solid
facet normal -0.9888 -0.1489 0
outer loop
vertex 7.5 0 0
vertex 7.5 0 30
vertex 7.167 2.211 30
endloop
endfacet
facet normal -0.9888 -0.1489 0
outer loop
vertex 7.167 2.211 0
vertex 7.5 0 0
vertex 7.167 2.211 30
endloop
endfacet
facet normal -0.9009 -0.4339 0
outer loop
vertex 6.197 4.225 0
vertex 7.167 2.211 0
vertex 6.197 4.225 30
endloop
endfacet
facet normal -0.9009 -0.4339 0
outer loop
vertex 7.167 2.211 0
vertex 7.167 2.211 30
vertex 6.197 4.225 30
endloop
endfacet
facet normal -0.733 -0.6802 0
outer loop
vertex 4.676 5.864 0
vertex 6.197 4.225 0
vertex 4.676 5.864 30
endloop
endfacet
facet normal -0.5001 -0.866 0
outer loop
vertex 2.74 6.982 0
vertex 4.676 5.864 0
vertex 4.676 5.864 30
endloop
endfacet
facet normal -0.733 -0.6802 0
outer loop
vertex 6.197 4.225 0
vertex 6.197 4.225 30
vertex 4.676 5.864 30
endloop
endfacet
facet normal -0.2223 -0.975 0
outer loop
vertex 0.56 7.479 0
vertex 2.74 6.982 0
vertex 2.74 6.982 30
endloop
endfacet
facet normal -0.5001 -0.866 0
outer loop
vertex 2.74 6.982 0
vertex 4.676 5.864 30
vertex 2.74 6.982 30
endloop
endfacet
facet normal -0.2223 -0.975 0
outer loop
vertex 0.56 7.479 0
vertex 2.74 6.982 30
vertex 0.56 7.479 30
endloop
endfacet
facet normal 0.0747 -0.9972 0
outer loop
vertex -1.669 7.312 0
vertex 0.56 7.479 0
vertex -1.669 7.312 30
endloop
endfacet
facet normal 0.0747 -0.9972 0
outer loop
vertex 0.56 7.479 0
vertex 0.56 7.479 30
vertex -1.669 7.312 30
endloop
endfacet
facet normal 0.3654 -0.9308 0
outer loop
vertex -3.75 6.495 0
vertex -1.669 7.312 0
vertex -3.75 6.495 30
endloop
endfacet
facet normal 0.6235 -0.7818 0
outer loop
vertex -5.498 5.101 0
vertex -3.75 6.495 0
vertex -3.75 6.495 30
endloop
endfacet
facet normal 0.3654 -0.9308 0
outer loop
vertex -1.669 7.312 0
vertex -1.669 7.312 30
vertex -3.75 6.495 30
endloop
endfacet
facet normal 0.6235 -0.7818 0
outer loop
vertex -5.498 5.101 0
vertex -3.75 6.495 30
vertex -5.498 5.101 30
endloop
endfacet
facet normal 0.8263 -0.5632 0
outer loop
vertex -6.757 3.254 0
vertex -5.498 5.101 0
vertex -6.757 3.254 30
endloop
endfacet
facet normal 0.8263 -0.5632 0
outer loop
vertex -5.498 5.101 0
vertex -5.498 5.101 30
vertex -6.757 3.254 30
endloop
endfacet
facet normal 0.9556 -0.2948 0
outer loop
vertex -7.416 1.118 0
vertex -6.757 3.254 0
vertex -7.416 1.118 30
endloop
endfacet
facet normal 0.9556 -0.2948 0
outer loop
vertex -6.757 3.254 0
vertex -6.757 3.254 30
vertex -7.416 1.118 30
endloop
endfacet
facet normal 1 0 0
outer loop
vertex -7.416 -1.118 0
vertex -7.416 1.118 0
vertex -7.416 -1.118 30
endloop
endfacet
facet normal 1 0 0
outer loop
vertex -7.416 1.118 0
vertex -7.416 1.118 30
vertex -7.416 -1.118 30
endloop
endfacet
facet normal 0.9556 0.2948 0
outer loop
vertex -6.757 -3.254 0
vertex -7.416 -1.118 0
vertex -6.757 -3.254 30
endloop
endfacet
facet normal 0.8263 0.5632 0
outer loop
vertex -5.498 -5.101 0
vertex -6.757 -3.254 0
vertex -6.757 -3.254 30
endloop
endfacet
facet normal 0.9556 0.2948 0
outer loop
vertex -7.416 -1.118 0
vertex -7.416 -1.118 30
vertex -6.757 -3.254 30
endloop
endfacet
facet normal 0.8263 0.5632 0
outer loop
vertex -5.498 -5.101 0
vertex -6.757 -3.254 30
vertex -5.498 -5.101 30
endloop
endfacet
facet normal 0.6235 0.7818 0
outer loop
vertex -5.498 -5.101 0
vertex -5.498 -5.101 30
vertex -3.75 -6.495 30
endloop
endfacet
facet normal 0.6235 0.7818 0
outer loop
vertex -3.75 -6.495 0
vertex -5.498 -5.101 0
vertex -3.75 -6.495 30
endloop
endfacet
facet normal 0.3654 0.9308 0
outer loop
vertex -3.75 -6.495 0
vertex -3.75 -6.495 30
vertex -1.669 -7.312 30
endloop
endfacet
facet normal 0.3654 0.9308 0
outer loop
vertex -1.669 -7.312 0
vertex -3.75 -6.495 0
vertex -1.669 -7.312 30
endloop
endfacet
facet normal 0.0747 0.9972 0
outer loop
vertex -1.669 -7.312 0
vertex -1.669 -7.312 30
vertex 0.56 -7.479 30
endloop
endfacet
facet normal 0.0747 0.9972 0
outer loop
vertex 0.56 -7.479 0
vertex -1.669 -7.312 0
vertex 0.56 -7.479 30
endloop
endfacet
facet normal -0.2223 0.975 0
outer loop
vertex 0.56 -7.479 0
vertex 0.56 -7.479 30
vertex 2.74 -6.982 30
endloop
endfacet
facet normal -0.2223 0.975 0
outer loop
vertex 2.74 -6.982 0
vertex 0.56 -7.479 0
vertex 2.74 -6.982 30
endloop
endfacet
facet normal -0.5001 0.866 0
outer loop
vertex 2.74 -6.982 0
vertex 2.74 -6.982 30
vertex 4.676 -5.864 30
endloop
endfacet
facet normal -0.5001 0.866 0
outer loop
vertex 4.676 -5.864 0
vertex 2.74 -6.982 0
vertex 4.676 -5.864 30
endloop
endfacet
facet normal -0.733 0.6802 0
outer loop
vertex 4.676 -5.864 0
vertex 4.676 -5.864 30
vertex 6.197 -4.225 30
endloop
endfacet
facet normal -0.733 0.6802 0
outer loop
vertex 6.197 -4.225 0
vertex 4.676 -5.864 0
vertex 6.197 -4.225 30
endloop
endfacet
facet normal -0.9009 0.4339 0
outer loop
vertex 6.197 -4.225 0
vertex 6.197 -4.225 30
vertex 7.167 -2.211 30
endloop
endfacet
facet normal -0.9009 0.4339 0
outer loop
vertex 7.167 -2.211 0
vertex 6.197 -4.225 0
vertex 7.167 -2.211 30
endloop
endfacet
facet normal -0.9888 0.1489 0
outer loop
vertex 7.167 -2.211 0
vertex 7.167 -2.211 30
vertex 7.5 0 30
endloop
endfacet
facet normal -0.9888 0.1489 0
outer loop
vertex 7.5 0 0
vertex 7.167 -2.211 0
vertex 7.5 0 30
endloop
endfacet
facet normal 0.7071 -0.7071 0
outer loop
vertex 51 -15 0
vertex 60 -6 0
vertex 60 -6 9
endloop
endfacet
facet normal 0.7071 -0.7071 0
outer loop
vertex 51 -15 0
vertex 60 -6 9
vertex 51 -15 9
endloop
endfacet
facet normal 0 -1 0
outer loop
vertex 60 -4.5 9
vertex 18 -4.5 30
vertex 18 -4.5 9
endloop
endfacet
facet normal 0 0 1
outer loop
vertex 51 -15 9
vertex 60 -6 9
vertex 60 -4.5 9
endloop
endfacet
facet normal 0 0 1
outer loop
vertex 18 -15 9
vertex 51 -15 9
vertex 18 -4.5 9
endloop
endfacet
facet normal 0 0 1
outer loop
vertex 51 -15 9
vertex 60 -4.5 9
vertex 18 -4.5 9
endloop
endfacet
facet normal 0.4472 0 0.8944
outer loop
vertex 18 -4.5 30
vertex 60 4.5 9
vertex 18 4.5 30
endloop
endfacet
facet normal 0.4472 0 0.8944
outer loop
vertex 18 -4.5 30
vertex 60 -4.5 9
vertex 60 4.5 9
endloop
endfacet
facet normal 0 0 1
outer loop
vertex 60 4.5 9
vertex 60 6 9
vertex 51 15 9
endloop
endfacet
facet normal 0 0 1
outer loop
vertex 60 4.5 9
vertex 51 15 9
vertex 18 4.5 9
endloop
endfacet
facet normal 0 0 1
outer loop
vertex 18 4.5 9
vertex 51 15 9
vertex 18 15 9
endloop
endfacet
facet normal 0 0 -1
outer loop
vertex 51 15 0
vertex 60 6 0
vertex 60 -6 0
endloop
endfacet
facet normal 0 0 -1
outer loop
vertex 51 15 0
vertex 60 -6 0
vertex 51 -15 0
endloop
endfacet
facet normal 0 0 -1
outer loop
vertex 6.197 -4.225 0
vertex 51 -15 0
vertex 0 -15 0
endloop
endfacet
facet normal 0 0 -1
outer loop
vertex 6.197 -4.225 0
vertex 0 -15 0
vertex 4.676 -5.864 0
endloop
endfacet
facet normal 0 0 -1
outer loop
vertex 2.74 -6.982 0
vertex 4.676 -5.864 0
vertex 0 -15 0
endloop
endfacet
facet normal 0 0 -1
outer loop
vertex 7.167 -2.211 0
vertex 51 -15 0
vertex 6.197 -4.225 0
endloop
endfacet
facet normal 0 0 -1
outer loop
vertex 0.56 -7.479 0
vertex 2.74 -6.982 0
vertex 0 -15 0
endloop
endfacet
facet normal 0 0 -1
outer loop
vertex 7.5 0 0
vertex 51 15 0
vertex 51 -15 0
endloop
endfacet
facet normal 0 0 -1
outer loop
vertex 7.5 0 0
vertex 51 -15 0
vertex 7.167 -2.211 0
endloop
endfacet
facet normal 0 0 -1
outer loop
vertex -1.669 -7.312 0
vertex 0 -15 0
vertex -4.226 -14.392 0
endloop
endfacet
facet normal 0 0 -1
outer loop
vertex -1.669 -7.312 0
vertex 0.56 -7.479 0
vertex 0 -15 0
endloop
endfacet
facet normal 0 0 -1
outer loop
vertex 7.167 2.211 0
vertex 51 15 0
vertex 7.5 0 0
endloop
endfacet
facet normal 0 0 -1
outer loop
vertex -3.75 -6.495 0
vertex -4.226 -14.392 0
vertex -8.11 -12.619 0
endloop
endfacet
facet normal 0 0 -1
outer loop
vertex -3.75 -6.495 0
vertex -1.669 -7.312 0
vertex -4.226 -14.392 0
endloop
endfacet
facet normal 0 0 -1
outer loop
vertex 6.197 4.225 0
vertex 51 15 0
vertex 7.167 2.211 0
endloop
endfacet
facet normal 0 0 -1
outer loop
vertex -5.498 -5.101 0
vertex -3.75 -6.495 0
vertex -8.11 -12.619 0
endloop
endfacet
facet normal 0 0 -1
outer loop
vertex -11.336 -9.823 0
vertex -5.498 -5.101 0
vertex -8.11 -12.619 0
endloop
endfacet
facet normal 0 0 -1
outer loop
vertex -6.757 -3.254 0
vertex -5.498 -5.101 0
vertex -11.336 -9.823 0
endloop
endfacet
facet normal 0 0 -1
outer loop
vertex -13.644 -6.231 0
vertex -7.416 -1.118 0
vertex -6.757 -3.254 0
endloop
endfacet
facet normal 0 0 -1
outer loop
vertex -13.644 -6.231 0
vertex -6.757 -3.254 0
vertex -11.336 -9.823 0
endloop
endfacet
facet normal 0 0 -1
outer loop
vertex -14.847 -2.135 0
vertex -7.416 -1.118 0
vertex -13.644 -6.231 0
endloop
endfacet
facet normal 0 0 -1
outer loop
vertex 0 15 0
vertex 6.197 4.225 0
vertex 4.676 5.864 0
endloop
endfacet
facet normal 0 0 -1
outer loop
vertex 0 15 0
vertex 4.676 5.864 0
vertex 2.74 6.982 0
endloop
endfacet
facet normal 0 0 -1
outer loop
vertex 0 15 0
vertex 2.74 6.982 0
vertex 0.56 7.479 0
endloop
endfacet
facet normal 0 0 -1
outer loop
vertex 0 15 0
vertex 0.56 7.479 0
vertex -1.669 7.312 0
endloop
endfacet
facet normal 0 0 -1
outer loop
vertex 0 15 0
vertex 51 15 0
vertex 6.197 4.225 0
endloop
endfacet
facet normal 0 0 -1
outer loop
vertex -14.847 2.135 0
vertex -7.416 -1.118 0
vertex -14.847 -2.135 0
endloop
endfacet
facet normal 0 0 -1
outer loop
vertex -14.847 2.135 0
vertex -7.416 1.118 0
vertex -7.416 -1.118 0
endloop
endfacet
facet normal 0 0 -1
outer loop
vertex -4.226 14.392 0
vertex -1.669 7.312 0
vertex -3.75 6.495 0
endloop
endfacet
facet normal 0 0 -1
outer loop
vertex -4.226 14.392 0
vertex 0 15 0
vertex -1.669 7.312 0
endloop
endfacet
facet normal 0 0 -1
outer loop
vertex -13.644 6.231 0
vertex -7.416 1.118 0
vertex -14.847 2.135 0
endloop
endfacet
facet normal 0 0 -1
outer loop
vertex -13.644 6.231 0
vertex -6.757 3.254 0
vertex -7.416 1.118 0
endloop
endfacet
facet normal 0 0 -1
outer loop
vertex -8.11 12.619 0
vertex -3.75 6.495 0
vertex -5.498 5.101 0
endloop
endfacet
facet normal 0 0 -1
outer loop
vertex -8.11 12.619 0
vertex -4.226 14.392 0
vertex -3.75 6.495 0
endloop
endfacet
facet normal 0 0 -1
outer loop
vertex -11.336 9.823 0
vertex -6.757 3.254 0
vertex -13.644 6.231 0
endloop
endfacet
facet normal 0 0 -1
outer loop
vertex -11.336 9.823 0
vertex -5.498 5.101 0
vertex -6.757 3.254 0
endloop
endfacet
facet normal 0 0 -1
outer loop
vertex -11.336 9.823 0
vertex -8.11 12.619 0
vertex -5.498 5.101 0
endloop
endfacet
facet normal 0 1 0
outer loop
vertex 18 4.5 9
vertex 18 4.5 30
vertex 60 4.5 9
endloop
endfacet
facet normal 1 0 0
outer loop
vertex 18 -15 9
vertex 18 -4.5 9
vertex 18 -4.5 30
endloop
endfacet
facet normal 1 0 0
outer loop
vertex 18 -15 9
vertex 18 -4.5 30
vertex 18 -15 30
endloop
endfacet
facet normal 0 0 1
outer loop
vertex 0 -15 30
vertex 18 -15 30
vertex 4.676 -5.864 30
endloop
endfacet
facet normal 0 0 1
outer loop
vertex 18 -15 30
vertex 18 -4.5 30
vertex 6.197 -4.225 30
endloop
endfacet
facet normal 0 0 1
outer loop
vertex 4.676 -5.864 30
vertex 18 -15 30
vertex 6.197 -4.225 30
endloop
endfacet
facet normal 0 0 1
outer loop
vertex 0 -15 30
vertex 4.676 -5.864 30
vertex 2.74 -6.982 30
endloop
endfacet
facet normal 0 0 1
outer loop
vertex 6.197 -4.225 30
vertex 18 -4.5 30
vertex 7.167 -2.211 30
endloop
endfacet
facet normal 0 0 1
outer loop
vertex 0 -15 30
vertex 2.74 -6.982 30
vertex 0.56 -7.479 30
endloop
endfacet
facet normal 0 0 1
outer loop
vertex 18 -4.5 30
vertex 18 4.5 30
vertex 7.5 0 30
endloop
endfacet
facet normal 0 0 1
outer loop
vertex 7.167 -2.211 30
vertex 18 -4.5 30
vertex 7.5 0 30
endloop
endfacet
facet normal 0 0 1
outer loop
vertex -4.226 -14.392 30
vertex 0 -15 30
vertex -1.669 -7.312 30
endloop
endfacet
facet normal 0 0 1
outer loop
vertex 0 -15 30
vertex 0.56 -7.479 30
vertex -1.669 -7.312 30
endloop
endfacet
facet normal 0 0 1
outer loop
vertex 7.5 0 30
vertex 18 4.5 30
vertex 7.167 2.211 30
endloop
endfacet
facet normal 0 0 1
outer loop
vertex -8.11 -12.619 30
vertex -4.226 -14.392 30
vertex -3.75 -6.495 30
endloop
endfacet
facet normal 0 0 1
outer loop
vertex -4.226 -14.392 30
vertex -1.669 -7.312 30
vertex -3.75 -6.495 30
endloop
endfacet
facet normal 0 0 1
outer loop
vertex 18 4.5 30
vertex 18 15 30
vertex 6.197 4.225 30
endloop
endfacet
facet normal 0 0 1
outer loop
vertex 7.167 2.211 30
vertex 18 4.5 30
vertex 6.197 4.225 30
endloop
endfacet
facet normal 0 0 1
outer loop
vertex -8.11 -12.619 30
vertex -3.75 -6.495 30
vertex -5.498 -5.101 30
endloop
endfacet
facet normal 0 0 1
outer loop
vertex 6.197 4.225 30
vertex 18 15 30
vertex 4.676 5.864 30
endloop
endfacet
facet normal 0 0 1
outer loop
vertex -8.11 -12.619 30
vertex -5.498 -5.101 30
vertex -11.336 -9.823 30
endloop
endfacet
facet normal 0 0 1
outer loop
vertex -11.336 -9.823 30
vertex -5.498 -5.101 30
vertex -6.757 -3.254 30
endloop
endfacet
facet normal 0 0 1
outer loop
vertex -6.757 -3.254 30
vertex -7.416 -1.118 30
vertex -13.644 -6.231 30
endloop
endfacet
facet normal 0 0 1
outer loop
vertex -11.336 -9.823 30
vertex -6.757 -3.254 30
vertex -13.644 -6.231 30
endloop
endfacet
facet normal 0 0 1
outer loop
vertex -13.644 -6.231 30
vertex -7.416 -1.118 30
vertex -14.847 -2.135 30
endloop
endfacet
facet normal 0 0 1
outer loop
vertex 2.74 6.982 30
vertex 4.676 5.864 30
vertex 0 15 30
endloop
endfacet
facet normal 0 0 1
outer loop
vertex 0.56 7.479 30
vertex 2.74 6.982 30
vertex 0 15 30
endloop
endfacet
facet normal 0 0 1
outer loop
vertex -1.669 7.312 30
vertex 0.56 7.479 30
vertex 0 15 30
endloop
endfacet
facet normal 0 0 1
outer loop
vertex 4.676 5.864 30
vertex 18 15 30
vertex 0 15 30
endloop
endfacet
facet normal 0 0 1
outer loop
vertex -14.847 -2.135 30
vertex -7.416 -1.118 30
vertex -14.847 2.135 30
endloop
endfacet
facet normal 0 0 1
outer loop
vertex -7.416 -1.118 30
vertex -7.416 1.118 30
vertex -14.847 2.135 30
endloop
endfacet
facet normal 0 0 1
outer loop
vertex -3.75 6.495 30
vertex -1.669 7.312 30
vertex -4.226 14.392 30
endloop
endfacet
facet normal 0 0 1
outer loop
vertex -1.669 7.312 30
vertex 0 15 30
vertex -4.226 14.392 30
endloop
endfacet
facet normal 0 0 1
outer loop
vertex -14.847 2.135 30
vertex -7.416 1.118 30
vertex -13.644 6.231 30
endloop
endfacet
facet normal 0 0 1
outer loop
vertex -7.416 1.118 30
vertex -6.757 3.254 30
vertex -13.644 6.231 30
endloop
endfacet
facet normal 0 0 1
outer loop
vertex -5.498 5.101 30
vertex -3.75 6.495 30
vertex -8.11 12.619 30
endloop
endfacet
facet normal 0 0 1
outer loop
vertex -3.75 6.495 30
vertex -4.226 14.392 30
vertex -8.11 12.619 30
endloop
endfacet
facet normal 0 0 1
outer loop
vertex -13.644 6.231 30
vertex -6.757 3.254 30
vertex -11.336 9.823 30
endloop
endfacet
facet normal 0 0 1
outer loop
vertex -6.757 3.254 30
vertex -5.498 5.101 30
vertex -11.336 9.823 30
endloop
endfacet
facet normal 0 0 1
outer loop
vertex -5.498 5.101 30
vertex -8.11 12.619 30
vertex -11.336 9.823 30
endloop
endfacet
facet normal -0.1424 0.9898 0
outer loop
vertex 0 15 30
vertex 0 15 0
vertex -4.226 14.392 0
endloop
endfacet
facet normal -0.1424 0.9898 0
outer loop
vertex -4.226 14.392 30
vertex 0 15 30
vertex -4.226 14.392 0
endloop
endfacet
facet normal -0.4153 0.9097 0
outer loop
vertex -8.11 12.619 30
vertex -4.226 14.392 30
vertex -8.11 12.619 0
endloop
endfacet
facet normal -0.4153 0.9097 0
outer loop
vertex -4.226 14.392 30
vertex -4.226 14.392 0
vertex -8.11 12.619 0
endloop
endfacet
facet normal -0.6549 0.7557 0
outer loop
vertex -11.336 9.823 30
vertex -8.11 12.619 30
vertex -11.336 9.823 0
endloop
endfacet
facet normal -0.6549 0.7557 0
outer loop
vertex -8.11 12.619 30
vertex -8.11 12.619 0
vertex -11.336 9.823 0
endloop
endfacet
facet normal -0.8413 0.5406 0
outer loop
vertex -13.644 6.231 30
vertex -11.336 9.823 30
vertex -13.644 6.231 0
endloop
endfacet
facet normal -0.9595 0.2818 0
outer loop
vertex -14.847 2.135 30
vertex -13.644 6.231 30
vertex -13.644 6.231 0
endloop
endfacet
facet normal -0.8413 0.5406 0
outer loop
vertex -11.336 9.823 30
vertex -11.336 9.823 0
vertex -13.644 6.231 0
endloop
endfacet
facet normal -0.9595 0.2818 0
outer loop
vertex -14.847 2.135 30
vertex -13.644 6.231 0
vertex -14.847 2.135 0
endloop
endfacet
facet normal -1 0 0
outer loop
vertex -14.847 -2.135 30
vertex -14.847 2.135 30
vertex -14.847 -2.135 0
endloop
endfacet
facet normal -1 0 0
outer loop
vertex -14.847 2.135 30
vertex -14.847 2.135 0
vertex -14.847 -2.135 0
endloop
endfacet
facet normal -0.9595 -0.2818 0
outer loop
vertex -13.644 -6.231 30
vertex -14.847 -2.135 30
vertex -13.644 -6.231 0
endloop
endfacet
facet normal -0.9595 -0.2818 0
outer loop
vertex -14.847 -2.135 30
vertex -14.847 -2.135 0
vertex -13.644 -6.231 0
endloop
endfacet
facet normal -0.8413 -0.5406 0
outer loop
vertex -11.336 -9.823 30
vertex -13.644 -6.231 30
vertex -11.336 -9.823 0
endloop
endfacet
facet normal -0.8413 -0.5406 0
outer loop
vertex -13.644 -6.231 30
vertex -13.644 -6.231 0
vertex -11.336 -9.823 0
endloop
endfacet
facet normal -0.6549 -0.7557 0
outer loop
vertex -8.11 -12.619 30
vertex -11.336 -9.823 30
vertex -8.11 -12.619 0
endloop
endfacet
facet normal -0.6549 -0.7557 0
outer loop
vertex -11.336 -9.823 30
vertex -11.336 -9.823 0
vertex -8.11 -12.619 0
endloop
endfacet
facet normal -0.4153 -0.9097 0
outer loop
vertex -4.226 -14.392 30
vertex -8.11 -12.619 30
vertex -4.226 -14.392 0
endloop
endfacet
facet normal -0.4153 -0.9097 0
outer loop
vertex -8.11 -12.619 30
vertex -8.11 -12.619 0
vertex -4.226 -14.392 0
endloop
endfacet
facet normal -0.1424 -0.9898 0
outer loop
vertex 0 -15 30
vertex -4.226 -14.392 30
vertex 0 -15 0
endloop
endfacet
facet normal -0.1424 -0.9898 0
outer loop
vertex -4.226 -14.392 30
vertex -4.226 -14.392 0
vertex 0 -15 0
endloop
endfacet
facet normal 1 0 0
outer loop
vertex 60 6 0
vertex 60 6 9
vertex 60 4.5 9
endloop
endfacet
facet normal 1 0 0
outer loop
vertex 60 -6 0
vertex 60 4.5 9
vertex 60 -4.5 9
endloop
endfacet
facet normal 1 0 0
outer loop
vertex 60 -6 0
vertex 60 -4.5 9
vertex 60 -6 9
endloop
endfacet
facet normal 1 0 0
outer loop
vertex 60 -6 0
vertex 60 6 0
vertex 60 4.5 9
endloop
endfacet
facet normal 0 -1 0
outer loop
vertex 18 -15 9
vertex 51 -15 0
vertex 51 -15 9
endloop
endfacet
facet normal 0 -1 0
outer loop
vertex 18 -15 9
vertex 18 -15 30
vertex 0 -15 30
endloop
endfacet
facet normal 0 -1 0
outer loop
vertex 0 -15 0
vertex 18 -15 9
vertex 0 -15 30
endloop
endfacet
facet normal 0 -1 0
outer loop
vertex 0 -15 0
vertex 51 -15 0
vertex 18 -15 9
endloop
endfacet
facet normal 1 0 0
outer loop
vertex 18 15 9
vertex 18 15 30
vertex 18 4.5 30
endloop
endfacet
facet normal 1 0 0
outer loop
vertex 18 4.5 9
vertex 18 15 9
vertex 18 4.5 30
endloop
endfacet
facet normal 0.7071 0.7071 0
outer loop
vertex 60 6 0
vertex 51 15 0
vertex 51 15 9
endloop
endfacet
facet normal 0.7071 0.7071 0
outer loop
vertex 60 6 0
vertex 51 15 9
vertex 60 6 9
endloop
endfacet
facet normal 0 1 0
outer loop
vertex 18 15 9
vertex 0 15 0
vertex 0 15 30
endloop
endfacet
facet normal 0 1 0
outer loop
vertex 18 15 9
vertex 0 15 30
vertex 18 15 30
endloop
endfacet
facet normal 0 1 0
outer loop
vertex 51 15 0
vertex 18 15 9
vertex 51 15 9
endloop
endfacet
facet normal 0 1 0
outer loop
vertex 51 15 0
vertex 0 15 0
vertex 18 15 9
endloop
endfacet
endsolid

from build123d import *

# Parameters (mm, degrees)
PAD_DEPTH    = 30
PAD001_DEPTH = 9
PAD002_DEPTH = 4.5
SKETCH003_R  = 7.5
POCKET_DEPTH = 30.001


with BuildPart() as part:
    # Sketch → Pad (new body)
    with BuildSketch(Plane.XY):
        with BuildLine():
            Line((-3.1e-05, 15), (17.999969, 15))
            Line((17.999969, 15), (17.999969, -15))
            Line((17.999969, -15), (0, -15))
            ThreePointArc((-3.1e-05, 15), (-15, -1.5e-05), (0, -15))
        make_face()
    extrude(amount=PAD_DEPTH)

    # Sketch001 → Pad001 (join)
    with BuildSketch(Plane.XY):
        Polygon((17.999969, 15), (50.999969, 15), (59.999969, 6), (59.999969, -6), (50.999969, -15), (17.999969, -15), align=None)
    extrude(amount=PAD001_DEPTH)

    # Sketch002 → Pad002 (join, symmetric)
    with BuildSketch(Plane.XZ):
        Polygon((17.999969, 30), (17.999969, 9), (59.999969, 9), align=None)
    extrude(amount=PAD002_DEPTH, both=True)

    # Sketch003 (on Face7 of Pad002) → Pocket (cut, through all)
    with BuildSketch(Plane.XY.offset(30)):
        Circle(SKETCH003_R)
    extrude(amount=-POCKET_DEPTH, mode=Mode.SUBTRACT)


solid = part.part
